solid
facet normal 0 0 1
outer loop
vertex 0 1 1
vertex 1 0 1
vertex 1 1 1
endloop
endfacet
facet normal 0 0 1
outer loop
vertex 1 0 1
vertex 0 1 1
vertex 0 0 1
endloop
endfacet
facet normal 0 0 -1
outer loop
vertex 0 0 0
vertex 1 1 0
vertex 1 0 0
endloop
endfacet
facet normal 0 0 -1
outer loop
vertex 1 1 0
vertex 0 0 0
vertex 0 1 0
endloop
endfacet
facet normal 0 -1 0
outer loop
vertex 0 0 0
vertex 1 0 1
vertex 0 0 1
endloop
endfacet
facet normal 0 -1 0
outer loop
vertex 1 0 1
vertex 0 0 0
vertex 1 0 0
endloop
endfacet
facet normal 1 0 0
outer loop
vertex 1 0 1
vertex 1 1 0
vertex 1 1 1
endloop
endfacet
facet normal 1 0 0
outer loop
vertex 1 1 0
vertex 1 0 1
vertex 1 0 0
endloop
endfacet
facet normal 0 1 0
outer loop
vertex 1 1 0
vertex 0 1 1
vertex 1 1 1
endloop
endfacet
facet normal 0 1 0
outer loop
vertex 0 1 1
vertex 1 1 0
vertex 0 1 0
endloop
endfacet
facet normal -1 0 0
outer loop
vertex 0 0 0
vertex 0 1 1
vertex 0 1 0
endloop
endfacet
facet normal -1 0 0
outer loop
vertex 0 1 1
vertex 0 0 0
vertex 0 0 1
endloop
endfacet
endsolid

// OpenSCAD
// Volume: 1, SurfaceArea: 6
polyhedron(
  points=[
    [0, 0, 0],
    [1, 0, 0],
    [0, 1, 0],
    [1, 1, 0],
    [0, 0, 1],
    [1, 0, 1],
    [0, 1, 1],
    [1, 1, 1],
  ],
  faces=[
    [6,7,5,4],
    [0,1,3,2],
    [4,5,1,0],
    [5,7,3,1],
    [7,6,2,3],
    [6,4,0,2],
  ]);
